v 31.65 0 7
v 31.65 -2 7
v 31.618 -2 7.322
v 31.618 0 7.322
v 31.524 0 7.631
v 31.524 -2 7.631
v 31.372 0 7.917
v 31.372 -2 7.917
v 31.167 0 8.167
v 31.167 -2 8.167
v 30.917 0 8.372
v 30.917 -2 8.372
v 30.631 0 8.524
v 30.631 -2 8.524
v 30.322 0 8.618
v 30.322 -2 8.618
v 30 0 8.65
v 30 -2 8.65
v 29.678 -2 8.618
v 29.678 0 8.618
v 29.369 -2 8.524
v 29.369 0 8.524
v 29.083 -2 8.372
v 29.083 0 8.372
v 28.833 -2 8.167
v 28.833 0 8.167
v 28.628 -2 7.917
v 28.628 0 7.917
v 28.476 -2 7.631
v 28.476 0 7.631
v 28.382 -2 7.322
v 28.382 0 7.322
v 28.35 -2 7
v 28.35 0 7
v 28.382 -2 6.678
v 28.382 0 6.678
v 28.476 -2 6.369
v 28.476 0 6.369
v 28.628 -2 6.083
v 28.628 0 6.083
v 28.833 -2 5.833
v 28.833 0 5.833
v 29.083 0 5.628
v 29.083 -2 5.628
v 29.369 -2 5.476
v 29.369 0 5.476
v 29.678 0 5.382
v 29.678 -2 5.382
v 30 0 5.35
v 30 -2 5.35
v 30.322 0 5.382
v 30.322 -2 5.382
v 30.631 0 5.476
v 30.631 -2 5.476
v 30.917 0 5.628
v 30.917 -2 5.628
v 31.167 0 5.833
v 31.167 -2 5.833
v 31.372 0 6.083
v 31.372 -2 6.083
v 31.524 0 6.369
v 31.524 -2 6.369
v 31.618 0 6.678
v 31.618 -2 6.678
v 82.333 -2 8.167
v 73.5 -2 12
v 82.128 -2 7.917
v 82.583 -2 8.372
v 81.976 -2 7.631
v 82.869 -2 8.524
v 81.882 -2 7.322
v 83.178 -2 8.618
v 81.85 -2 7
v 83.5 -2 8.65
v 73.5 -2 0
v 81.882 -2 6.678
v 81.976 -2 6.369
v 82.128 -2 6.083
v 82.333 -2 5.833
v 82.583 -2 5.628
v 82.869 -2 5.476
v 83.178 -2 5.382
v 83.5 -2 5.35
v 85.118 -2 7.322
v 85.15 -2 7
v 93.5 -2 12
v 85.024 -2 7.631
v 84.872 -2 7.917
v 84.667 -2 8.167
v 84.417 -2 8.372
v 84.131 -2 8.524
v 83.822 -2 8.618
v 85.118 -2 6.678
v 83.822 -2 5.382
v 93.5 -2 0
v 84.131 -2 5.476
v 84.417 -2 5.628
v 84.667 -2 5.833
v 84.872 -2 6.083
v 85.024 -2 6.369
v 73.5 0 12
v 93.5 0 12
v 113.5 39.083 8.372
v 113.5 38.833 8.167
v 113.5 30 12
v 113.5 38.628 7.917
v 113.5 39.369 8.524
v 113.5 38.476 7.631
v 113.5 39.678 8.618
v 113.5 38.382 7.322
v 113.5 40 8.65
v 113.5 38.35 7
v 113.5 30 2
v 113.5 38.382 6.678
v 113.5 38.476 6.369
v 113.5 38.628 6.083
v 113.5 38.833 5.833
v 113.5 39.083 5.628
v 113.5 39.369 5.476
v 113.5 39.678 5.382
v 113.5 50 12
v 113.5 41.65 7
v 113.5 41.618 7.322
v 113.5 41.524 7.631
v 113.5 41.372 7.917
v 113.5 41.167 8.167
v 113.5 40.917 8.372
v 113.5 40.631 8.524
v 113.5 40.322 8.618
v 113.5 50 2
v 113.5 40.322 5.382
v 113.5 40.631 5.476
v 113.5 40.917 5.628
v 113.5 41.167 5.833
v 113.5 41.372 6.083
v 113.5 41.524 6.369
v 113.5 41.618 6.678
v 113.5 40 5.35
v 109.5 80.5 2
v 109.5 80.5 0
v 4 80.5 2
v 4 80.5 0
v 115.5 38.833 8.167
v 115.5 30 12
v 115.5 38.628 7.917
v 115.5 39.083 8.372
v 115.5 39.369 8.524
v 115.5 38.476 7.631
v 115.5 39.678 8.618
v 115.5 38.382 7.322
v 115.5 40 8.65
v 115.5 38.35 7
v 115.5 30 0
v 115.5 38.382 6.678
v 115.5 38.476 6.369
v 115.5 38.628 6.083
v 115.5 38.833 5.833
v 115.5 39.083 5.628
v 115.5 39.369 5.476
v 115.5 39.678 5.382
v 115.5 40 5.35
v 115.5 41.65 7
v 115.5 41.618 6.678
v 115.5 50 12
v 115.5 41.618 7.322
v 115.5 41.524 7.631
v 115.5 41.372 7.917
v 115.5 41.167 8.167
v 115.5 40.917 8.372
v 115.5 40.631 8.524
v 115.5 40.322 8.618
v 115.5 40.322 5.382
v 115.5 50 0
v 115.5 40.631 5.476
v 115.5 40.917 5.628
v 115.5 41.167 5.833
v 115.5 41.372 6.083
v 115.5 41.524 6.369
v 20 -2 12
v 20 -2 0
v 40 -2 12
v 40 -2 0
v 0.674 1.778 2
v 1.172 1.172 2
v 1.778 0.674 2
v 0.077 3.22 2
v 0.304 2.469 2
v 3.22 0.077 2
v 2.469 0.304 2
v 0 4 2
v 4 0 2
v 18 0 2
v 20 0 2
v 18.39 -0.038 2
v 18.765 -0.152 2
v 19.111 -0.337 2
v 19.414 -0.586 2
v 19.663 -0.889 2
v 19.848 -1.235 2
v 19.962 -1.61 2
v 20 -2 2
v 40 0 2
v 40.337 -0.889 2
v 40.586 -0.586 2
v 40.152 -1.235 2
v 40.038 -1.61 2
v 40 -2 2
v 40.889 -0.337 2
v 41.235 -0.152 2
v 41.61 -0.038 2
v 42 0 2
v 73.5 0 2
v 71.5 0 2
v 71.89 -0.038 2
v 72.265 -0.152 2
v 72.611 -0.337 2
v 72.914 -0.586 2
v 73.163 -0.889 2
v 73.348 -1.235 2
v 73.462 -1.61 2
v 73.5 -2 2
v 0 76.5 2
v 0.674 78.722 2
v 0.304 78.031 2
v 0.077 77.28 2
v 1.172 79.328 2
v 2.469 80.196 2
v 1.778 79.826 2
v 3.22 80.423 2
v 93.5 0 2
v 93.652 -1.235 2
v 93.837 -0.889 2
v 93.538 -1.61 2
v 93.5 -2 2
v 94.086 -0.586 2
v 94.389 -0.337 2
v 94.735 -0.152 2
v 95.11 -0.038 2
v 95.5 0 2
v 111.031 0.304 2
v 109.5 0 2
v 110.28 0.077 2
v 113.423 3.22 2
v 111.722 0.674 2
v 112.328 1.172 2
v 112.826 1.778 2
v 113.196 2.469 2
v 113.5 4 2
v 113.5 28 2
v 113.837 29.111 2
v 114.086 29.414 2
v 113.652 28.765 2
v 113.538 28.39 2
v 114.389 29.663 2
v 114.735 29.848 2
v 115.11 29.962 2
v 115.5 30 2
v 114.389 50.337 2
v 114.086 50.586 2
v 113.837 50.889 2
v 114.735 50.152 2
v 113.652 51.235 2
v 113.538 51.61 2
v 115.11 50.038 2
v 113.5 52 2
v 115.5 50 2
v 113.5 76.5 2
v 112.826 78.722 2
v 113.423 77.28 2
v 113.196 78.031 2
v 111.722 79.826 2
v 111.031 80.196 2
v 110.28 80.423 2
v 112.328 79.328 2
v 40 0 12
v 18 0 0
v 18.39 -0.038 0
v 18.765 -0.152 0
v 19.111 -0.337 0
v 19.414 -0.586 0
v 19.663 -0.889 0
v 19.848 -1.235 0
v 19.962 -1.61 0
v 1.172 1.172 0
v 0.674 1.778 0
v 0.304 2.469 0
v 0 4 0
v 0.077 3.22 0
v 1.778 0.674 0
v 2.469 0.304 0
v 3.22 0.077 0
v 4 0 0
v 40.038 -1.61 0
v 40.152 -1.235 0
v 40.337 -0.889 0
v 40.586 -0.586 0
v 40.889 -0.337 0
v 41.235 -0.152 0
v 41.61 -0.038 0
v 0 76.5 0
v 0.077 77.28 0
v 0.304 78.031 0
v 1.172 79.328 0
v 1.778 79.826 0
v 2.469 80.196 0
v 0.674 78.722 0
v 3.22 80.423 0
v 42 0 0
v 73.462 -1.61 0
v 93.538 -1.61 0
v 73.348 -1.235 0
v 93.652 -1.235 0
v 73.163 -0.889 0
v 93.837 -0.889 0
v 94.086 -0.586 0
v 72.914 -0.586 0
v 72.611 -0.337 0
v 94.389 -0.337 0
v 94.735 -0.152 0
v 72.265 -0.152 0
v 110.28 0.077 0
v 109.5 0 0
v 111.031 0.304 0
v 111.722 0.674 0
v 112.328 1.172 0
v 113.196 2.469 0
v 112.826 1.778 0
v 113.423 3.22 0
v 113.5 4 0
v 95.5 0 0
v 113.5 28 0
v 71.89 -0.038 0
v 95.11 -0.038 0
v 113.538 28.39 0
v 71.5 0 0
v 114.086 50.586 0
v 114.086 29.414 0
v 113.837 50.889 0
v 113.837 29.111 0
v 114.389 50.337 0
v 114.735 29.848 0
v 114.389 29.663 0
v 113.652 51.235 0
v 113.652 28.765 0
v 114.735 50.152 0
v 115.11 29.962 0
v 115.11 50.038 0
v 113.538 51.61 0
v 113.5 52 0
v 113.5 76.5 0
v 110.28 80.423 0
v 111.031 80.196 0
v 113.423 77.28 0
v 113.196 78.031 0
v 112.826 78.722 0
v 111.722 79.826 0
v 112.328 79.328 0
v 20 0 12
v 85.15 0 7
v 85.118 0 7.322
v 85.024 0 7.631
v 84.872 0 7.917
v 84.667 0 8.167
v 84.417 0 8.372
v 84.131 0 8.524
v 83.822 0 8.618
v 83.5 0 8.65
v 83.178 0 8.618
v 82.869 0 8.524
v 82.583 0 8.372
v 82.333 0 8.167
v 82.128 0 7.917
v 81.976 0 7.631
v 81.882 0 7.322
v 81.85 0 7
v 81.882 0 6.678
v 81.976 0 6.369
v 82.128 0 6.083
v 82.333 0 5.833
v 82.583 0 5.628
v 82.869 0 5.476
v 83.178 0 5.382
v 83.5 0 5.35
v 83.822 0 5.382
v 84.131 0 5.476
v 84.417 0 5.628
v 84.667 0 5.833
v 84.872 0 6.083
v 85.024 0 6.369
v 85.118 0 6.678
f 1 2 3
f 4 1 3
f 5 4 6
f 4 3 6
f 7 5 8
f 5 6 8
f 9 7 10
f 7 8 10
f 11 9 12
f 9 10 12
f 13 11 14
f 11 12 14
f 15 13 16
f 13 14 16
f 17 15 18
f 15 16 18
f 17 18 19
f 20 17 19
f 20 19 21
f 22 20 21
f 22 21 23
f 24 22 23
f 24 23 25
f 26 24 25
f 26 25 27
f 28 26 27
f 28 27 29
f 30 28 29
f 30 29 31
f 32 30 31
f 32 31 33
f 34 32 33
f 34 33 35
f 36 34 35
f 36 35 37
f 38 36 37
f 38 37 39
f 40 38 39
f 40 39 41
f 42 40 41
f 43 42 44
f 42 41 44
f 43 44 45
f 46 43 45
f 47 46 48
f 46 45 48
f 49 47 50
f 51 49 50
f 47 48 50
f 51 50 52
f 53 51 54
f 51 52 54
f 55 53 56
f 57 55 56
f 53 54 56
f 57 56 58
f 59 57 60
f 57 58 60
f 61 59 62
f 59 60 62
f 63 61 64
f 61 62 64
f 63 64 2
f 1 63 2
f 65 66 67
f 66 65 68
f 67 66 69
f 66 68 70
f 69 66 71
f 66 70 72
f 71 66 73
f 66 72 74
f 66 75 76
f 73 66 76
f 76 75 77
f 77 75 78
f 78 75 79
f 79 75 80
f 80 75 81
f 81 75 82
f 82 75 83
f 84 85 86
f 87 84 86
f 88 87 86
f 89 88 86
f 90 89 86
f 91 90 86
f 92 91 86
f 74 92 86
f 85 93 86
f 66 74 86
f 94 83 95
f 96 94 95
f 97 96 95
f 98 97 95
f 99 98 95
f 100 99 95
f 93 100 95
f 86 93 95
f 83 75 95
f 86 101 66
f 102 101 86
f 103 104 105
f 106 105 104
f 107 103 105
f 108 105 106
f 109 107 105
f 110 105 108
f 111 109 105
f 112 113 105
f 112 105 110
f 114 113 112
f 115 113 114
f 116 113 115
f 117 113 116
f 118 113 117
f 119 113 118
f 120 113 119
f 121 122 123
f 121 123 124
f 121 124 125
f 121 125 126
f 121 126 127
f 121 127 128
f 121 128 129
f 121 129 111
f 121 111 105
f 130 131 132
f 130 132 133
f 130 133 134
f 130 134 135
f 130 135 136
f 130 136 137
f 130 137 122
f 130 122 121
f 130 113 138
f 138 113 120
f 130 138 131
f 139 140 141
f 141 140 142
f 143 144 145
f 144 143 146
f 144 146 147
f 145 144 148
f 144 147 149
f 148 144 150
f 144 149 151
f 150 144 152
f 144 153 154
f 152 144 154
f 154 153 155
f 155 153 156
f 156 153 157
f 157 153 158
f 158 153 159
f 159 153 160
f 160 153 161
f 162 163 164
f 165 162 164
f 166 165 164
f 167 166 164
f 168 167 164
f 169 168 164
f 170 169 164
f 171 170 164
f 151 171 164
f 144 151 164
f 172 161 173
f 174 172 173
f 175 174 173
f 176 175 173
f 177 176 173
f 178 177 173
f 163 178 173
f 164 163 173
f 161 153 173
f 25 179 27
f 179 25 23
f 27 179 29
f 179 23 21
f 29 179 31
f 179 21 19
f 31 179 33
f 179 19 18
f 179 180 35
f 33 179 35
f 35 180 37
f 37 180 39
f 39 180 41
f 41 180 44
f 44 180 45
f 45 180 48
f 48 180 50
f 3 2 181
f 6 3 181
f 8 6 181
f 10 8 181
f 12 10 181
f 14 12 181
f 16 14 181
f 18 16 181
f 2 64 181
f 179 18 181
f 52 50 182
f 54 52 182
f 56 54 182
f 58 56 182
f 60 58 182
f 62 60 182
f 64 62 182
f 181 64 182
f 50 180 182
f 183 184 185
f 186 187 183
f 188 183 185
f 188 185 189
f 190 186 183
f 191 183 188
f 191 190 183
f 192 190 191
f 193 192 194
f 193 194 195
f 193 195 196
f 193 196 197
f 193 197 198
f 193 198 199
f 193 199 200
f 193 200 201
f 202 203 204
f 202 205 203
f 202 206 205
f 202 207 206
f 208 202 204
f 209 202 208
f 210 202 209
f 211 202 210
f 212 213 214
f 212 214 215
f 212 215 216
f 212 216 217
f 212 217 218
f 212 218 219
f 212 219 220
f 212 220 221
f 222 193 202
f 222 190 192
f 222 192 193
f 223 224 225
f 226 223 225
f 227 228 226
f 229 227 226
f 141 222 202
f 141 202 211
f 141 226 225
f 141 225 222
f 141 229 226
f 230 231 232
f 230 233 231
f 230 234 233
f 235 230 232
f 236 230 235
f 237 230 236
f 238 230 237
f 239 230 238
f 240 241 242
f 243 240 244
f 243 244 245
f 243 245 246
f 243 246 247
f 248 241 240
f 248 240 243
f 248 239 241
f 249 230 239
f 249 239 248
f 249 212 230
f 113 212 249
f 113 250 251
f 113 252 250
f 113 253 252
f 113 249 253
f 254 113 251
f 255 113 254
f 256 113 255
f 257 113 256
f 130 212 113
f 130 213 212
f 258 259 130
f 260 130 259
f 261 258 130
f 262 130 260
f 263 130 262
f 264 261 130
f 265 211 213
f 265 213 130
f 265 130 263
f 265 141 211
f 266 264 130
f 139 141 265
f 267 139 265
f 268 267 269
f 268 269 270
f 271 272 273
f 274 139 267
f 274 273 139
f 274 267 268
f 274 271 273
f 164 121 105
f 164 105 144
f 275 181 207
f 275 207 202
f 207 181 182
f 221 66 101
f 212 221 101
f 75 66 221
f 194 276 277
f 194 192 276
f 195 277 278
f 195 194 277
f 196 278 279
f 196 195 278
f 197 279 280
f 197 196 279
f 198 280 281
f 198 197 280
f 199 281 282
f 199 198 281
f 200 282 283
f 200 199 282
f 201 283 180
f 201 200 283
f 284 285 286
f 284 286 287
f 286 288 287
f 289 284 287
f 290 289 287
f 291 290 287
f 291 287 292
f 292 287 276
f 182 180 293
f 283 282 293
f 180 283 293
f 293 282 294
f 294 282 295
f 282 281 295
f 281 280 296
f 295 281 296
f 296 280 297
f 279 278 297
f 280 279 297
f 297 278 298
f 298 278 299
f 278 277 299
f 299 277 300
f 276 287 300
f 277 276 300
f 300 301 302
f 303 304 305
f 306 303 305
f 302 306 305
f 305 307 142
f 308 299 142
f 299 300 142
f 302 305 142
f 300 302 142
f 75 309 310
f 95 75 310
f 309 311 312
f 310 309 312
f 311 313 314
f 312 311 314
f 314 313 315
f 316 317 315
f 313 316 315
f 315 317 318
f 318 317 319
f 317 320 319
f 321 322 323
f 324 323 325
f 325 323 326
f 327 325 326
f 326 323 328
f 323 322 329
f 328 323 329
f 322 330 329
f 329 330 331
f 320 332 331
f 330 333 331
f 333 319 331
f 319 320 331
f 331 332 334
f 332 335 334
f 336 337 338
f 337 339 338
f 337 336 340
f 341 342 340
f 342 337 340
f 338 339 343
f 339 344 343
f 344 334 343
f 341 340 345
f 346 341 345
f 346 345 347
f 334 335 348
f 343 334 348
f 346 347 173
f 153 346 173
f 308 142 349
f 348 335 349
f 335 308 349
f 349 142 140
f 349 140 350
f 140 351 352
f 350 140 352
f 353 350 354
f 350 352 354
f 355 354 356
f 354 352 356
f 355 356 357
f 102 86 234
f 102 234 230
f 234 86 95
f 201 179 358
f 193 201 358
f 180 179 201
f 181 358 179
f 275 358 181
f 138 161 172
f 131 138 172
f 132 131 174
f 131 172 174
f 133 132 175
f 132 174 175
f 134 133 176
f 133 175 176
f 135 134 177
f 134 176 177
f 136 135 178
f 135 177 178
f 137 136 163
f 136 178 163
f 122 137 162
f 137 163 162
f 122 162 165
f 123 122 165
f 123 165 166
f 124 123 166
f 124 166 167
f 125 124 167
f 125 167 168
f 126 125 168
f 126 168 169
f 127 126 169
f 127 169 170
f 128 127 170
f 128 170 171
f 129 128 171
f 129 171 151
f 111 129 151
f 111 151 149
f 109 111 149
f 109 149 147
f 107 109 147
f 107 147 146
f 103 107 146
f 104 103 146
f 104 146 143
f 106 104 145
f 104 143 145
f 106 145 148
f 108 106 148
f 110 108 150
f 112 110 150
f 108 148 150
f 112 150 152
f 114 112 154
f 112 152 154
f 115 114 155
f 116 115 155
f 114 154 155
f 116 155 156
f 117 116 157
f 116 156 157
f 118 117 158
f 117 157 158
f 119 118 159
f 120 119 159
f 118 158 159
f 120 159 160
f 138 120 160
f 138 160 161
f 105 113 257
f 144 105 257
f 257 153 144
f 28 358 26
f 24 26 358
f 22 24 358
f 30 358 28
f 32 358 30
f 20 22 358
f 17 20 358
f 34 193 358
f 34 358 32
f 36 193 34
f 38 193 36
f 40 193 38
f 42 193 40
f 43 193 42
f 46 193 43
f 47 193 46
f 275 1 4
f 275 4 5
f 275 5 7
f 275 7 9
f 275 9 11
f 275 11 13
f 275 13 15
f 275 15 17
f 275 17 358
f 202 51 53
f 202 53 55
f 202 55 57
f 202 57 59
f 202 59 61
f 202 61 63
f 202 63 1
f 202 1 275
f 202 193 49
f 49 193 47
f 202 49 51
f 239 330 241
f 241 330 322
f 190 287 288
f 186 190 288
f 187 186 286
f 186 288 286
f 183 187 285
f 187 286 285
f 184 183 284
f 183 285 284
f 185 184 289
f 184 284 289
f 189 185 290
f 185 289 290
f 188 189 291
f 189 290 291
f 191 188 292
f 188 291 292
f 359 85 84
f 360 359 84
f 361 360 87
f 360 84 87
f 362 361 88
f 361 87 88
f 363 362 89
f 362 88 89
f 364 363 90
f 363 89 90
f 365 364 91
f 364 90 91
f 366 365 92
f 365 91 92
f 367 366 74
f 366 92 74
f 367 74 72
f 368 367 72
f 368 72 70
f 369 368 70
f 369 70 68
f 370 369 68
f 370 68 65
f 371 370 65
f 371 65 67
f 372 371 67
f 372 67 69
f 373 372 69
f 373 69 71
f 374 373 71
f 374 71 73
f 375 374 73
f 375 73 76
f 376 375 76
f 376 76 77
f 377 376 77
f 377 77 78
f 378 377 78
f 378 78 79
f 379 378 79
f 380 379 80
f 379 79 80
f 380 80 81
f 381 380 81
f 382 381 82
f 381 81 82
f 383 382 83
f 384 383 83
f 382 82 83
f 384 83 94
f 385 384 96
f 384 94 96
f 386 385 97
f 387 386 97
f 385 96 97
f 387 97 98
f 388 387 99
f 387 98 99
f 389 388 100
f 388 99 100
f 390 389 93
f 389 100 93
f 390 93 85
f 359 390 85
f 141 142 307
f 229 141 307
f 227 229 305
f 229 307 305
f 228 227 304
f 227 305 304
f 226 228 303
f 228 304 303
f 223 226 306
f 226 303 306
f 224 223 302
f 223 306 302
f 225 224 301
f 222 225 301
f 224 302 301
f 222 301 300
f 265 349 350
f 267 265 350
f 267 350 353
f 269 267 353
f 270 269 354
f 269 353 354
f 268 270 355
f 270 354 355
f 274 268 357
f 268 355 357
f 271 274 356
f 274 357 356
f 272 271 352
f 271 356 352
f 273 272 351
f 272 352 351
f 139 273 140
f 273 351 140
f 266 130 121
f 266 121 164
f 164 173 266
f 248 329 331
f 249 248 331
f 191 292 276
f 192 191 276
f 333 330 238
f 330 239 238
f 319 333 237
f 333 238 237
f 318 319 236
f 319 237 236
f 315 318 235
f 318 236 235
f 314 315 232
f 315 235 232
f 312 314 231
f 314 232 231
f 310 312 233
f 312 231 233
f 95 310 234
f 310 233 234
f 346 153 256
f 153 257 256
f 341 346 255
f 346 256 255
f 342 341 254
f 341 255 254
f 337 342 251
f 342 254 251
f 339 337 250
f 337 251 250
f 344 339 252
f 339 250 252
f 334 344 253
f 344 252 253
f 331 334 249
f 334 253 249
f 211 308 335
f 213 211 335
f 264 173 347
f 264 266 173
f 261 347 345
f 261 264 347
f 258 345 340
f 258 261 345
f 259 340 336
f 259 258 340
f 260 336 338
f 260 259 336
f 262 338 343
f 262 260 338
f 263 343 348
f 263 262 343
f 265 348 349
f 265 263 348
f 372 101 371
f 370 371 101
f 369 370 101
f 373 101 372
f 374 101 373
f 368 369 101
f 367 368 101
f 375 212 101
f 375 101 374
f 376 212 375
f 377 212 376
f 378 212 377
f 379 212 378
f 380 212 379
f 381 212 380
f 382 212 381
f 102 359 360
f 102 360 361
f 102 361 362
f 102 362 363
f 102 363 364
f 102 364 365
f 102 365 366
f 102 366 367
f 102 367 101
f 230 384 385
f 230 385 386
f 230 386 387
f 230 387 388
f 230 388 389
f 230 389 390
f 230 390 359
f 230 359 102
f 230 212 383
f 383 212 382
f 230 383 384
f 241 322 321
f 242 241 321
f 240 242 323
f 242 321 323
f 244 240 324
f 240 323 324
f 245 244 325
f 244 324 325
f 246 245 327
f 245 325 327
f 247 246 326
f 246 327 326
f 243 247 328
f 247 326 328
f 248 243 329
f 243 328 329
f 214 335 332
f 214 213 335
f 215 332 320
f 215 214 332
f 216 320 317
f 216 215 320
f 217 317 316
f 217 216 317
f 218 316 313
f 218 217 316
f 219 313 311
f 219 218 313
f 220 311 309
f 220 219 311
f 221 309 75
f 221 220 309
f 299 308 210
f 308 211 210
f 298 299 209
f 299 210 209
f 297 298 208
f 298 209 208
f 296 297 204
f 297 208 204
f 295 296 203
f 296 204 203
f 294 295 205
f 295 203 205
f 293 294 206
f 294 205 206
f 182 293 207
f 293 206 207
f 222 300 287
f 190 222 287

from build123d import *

# Parameters (mm, degrees)
EXTRUDE_1_DEPTH      = 2
EXTRUDE_2_DEPTH      = 10
EXTRUDE_2_DEPTH_BACK = 2
SKETCH_2_W           = 2
SKETCH_2_H           = 20
SKETCH_2_W_2         = 20
SKETCH_2_H_2         = 2
SKETCH_3_R           = 1.65
CUT_EXTRUDE_1_DEPTH  = 12
SKETCH_4_R           = 1.65
CUT_EXTRUDE_2_DEPTH  = 12
FILLET_1_R           = 2


with BuildPart() as part:
    # 草图1 → 凸台-拉伸1 (new body)
    with BuildSketch(Plane.XY):
        with BuildLine():
            Line((4, 0), (109.5, 0))
            ThreePointArc((109.5, 0), (112.328427125, 1.171572875), (113.5, 4))
            Line((113.5, 4), (113.5, 76.5))
            ThreePointArc((113.5, 76.5), (112.328427125, 79.328427125), (109.5, 80.5))
            Line((109.5, 80.5), (4, 80.5))
            ThreePointArc((4, 80.5), (1.171572875, 79.328427125), (0, 76.5))
            Line((0, 76.5), (0, 4))
            ThreePointArc((0, 4), (1.171572875, 1.171572875), (4, 0))
        make_face()
    extrude(amount=EXTRUDE_1_DEPTH)

    # 草图2 → 凸台-拉伸2 (add, two sides: drawn at the far end of the back side and taken through both)
    with BuildSketch(Plane.XY.offset(2).offset(-EXTRUDE_2_DEPTH_BACK)):
        with Locations((114.5, 40)):
            Rectangle(SKETCH_2_W, SKETCH_2_H)
        with Locations((30, -1)):
            Rectangle(SKETCH_2_W_2, SKETCH_2_H_2)
        with Locations((83.5, -1)):
            Rectangle(SKETCH_2_W_2, SKETCH_2_H_2)
    extrude(amount=EXTRUDE_2_DEPTH + EXTRUDE_2_DEPTH_BACK)

    # 草图3 → 切除-拉伸1 (cut)
    with BuildSketch(Plane(origin=(115.5, 0, 0), x_dir=(0, 0, -1), z_dir=(1, 0, 0))):
        with Locations((-7, 40)):
            Circle(SKETCH_3_R)
    extrude(amount=-CUT_EXTRUDE_1_DEPTH, mode=Mode.SUBTRACT)

    # 草图4 → 切除-拉伸2 (cut)
    with BuildSketch(Plane(origin=(0, -2, 0), x_dir=(-1, 0, 0), z_dir=(0, -1, 0))):
        with Locations(Location((-83.5, -7, 0), (0, 0, 180))):
            Circle(SKETCH_4_R)
        with Locations(Location((-30, -7, 0), (0, 0, 180))):
            Circle(SKETCH_4_R)
    extrude(amount=-CUT_EXTRUDE_2_DEPTH, mode=Mode.SUBTRACT)

    # 圆角1
    fillet_1_edges = [part.edges().sort_by_distance(p)[0] for p in [
        (113.5, 50, 1),
        (113.5, 30, 1),
        (40, 0, 1),
        (20, 0, 1),
        (73.5, 0, 1),
        (93.5, 0, 1),
    ]]
    fillet(fillet_1_edges, radius=FILLET_1_R - 0.0001)  # a hair under: the kernel refuses the full size


solid = part.part
